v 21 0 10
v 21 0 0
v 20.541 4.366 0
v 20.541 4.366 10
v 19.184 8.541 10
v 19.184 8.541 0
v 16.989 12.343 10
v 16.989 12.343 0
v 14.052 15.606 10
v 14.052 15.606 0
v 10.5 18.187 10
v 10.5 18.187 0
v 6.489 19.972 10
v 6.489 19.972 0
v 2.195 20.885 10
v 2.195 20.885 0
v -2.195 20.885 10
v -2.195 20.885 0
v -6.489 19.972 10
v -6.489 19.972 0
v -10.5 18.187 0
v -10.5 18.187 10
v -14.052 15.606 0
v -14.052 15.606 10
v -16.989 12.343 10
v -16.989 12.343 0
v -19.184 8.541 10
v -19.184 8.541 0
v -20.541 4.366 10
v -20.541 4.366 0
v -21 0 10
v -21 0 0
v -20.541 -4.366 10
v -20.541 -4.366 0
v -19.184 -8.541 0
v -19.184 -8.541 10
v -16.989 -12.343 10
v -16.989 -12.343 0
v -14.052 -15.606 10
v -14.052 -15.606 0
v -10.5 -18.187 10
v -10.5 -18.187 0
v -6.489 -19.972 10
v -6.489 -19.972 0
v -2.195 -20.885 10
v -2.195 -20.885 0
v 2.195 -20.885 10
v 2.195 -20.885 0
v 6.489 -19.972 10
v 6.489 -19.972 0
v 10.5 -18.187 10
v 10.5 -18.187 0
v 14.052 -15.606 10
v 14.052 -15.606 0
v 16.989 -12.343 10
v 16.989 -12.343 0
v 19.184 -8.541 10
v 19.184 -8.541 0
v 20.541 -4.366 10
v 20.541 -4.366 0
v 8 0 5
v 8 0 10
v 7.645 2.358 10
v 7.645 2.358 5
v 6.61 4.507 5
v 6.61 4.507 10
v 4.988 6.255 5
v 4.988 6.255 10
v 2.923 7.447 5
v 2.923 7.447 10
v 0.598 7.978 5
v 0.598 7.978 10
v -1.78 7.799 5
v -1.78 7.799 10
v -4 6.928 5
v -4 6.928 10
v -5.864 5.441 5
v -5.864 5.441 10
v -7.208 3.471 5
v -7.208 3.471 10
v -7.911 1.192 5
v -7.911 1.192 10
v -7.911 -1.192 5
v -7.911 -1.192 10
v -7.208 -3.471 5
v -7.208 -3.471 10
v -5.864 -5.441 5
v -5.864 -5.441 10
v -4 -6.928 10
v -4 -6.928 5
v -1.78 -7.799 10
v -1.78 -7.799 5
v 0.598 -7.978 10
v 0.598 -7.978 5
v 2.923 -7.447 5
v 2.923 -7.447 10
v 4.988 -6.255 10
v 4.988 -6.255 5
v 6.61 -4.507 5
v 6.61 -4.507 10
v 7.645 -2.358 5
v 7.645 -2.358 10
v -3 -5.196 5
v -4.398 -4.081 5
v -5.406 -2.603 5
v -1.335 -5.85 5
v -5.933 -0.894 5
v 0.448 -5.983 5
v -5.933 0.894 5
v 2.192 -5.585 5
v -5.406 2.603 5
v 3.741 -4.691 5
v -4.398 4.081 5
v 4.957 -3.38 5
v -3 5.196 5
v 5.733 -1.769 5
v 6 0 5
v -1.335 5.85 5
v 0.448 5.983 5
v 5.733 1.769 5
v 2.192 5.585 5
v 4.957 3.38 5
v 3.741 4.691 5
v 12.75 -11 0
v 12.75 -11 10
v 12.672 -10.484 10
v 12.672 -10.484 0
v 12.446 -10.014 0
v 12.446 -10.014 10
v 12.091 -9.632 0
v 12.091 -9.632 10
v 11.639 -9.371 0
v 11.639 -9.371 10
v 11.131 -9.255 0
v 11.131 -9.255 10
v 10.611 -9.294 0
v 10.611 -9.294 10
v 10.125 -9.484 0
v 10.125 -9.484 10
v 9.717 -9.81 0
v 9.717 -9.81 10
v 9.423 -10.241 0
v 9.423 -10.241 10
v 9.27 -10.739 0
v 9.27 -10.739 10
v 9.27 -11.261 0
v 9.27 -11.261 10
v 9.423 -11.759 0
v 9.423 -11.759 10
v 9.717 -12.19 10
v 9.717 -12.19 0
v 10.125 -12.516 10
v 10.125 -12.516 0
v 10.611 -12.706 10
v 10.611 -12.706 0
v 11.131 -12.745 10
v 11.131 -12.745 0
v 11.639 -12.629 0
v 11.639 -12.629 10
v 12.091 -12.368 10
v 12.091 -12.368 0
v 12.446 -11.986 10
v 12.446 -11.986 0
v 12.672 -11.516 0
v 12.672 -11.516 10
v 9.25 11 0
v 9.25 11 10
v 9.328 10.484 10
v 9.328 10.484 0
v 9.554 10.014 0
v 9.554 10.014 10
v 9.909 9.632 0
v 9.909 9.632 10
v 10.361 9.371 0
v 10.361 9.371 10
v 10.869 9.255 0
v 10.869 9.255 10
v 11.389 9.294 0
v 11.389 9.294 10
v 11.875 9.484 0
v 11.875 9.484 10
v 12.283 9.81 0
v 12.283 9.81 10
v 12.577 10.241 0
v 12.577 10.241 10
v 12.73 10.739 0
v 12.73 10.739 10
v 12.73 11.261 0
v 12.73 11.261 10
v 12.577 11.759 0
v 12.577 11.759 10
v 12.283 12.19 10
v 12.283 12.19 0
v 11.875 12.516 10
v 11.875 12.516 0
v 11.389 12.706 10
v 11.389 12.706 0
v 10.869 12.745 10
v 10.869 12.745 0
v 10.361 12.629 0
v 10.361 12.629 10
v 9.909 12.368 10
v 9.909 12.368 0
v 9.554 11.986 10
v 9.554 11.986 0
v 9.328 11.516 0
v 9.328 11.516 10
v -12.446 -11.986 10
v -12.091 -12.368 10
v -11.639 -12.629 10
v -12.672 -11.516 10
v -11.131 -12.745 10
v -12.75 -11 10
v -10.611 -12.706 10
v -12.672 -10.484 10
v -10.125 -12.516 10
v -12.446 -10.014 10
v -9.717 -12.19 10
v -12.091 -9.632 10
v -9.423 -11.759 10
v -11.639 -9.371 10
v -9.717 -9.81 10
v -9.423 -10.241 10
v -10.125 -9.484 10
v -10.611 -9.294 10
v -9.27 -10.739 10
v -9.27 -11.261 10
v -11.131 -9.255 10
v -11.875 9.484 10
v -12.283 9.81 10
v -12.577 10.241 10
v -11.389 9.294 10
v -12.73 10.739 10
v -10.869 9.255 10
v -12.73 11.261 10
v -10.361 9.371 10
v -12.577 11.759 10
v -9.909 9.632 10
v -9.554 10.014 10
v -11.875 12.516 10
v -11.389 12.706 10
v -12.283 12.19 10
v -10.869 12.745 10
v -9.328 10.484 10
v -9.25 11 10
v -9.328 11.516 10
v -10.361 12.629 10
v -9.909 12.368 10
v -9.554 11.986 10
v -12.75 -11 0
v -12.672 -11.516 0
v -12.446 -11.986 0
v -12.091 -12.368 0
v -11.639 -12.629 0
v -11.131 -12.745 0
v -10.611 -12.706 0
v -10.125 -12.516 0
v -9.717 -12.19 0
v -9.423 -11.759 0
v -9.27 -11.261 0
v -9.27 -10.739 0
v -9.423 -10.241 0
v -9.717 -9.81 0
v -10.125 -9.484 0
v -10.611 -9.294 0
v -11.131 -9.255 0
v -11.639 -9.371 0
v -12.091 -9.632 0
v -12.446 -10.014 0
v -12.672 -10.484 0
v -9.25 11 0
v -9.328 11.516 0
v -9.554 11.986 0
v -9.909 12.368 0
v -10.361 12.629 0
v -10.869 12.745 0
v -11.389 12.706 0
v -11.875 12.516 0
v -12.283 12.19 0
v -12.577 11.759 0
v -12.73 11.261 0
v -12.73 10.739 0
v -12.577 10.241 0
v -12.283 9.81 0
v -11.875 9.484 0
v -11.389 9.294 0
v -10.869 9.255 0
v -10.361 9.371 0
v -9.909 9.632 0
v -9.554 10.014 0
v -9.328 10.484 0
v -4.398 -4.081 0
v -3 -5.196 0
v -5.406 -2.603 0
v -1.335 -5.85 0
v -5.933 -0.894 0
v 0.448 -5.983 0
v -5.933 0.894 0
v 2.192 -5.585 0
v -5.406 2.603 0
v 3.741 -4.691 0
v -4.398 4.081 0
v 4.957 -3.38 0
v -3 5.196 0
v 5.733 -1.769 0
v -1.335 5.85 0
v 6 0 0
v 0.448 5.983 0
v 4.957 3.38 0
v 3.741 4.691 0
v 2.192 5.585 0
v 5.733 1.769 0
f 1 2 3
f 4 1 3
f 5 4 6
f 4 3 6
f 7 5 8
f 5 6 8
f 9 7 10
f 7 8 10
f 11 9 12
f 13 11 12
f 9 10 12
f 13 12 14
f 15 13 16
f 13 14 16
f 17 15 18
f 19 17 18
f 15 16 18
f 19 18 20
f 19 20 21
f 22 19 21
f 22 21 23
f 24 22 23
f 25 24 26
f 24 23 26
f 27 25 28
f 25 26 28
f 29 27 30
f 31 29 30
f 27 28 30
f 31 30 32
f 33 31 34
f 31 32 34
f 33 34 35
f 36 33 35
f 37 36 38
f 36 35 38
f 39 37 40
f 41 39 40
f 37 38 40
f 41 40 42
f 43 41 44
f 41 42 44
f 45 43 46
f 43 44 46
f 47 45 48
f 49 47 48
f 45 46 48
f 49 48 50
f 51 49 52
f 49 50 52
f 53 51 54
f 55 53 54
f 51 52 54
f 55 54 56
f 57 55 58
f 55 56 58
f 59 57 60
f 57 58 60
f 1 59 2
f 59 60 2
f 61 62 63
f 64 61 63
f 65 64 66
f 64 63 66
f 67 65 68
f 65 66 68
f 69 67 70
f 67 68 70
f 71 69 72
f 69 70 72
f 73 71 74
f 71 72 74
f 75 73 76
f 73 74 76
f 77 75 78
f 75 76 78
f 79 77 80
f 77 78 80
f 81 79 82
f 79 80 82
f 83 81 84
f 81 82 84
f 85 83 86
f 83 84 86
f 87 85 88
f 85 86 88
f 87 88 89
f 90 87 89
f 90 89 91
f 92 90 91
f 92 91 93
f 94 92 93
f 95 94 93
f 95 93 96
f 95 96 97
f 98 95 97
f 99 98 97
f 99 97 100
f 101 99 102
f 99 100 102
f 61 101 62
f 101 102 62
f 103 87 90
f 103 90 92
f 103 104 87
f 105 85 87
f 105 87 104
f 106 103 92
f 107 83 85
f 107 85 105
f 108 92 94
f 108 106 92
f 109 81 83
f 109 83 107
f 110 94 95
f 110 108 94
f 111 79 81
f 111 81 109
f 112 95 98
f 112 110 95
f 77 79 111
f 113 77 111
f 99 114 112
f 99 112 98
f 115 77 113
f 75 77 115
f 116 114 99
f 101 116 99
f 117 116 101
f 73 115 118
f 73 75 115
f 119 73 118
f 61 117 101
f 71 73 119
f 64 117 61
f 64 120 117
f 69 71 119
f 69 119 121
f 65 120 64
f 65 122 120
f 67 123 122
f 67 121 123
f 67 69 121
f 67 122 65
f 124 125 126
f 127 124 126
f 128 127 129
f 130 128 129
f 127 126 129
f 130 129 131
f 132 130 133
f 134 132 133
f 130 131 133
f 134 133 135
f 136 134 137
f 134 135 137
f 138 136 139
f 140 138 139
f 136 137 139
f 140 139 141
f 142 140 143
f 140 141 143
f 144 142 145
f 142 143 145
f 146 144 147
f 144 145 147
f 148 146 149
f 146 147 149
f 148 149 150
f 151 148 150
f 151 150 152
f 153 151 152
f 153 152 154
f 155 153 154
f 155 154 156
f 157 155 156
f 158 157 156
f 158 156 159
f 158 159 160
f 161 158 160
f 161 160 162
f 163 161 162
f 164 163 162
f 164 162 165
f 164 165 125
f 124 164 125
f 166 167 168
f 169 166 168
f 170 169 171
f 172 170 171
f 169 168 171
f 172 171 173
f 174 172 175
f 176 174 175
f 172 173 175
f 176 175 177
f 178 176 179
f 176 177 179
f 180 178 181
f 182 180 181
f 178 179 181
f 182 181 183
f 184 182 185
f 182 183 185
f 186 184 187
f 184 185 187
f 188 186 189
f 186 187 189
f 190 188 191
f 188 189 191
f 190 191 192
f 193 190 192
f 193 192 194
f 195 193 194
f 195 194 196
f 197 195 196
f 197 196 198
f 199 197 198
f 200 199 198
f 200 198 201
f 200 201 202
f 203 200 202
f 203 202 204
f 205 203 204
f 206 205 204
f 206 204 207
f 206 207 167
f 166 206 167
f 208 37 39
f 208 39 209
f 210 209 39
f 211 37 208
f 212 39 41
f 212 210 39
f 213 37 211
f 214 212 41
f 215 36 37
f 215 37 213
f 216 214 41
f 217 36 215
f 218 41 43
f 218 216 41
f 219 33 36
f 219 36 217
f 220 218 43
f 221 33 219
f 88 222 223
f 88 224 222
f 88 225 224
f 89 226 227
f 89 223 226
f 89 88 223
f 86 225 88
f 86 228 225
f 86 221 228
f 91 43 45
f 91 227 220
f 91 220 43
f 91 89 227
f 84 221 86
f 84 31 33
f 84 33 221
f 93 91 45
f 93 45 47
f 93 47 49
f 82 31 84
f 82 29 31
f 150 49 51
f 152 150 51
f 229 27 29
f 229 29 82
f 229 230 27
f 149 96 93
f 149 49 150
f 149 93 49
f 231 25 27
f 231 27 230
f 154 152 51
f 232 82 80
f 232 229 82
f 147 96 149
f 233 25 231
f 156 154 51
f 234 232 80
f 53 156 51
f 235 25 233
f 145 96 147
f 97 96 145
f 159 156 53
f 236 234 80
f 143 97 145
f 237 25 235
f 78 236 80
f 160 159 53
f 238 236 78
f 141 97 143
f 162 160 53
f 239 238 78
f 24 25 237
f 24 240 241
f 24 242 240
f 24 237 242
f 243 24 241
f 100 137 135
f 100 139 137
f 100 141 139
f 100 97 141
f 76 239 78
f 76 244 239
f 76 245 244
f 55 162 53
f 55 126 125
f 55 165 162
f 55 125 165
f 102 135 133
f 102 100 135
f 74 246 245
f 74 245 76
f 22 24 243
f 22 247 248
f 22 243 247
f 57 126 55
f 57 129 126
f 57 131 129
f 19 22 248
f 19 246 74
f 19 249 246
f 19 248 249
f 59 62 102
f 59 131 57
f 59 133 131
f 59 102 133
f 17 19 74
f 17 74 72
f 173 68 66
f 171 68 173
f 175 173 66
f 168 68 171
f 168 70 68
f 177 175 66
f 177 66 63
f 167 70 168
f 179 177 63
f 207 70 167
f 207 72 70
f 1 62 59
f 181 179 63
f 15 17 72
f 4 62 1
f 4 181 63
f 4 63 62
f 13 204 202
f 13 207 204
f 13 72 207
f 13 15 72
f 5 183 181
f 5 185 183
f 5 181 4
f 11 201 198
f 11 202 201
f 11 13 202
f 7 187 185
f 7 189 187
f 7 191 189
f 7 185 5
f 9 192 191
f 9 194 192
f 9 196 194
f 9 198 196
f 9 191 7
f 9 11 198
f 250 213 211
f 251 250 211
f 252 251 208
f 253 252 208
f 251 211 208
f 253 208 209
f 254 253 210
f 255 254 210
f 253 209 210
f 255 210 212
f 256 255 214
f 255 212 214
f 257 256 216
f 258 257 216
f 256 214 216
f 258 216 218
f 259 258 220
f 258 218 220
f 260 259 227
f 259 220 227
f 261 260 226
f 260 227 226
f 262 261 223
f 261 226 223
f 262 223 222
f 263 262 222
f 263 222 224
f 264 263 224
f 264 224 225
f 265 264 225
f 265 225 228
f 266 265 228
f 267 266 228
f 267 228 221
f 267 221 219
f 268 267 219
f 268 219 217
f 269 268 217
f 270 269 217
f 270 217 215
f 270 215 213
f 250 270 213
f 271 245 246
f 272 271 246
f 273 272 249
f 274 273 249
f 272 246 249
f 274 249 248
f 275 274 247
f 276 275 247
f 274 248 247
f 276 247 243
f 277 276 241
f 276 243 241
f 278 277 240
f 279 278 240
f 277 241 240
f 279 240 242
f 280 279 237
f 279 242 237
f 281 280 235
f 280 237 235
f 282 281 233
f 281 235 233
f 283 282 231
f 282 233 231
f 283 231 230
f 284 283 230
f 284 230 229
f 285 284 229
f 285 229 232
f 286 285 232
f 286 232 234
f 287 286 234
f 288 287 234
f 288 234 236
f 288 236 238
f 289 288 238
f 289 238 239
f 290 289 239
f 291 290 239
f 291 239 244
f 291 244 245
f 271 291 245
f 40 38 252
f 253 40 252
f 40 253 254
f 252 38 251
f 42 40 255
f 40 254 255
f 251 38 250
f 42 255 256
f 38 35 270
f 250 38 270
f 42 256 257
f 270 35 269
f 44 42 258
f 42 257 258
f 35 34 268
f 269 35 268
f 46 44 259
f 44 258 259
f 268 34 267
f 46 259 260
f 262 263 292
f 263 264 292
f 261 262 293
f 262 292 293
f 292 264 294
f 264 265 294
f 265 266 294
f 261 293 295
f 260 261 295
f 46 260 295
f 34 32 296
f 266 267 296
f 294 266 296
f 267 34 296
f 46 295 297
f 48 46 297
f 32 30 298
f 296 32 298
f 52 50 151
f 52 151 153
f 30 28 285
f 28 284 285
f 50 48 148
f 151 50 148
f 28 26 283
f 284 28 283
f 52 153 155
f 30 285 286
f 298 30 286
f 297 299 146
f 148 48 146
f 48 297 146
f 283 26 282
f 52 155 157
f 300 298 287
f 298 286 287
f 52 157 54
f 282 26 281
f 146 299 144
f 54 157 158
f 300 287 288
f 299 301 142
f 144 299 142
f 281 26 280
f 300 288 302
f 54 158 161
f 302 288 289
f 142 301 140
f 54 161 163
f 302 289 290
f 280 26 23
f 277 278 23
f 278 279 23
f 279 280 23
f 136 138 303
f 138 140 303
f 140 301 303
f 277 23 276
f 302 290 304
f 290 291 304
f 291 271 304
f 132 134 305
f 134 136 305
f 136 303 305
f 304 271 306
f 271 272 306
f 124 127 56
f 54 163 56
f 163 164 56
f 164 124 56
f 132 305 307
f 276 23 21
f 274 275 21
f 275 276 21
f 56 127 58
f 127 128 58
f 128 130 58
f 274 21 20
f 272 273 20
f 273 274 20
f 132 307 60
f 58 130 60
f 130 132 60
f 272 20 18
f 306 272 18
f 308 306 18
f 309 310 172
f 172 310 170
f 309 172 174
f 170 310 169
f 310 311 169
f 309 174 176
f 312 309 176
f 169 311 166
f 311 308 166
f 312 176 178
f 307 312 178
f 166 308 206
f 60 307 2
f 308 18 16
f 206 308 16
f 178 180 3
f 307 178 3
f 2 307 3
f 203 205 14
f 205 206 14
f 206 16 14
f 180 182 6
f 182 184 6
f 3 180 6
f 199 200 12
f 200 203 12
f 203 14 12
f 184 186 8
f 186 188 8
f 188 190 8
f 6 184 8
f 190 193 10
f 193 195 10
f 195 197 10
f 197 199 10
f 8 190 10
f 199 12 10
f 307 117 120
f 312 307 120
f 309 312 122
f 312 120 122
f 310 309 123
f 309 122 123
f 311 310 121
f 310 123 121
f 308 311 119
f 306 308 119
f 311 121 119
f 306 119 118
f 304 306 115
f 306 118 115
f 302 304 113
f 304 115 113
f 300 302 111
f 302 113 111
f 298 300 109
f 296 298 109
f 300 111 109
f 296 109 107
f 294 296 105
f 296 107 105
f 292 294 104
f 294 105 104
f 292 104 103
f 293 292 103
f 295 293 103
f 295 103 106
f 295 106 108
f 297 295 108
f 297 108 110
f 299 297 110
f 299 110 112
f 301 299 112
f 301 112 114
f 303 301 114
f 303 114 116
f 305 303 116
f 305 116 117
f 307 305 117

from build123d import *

# Parameters (mm, degrees)
SKETCH1_R           = 21
BOSS_EXTRUDE1_DEPTH = 10
SKETCH2_R           = 6
CUT_EXTRUDE1_DEPTH  = 32.336879232
SKETCH3_R           = 8
CUT_EXTRUDE2_DEPTH  = 5
SKETCH4_R           = 1.75
CUT_EXTRUDE3_DEPTH  = 32.336879232


with BuildPart() as part:
    # Sketch1 → Boss-Extrude1 (new body)
    with BuildSketch(Plane.XY):
        Circle(SKETCH1_R)
    extrude(amount=BOSS_EXTRUDE1_DEPTH)

    # Sketch2 → Cut-Extrude1 (cut, through all)
    with BuildSketch(Plane.XY.offset(10)):
        Circle(SKETCH2_R)
    extrude(amount=-CUT_EXTRUDE1_DEPTH, mode=Mode.SUBTRACT)

    # Sketch3 → Cut-Extrude2 (cut)
    with BuildSketch(Plane.XY.offset(10)):
        Circle(SKETCH3_R)
    extrude(amount=-CUT_EXTRUDE2_DEPTH, mode=Mode.SUBTRACT)

    # Sketch4 → Cut-Extrude3 (cut, through all)
    with BuildSketch(Plane.XY.offset(10)):
        with Locations((-11, 11)):
            Circle(SKETCH4_R)
        with Locations(Location((11, 11, 0), (0, 0, 180))):
            Circle(SKETCH4_R)
        with Locations((11, -11)):
            Circle(SKETCH4_R)
        with Locations(Location((-11, -11, 0), (0, 0, 180))):
            Circle(SKETCH4_R)
    extrude(amount=-CUT_EXTRUDE3_DEPTH, mode=Mode.SUBTRACT)


solid = part.part
